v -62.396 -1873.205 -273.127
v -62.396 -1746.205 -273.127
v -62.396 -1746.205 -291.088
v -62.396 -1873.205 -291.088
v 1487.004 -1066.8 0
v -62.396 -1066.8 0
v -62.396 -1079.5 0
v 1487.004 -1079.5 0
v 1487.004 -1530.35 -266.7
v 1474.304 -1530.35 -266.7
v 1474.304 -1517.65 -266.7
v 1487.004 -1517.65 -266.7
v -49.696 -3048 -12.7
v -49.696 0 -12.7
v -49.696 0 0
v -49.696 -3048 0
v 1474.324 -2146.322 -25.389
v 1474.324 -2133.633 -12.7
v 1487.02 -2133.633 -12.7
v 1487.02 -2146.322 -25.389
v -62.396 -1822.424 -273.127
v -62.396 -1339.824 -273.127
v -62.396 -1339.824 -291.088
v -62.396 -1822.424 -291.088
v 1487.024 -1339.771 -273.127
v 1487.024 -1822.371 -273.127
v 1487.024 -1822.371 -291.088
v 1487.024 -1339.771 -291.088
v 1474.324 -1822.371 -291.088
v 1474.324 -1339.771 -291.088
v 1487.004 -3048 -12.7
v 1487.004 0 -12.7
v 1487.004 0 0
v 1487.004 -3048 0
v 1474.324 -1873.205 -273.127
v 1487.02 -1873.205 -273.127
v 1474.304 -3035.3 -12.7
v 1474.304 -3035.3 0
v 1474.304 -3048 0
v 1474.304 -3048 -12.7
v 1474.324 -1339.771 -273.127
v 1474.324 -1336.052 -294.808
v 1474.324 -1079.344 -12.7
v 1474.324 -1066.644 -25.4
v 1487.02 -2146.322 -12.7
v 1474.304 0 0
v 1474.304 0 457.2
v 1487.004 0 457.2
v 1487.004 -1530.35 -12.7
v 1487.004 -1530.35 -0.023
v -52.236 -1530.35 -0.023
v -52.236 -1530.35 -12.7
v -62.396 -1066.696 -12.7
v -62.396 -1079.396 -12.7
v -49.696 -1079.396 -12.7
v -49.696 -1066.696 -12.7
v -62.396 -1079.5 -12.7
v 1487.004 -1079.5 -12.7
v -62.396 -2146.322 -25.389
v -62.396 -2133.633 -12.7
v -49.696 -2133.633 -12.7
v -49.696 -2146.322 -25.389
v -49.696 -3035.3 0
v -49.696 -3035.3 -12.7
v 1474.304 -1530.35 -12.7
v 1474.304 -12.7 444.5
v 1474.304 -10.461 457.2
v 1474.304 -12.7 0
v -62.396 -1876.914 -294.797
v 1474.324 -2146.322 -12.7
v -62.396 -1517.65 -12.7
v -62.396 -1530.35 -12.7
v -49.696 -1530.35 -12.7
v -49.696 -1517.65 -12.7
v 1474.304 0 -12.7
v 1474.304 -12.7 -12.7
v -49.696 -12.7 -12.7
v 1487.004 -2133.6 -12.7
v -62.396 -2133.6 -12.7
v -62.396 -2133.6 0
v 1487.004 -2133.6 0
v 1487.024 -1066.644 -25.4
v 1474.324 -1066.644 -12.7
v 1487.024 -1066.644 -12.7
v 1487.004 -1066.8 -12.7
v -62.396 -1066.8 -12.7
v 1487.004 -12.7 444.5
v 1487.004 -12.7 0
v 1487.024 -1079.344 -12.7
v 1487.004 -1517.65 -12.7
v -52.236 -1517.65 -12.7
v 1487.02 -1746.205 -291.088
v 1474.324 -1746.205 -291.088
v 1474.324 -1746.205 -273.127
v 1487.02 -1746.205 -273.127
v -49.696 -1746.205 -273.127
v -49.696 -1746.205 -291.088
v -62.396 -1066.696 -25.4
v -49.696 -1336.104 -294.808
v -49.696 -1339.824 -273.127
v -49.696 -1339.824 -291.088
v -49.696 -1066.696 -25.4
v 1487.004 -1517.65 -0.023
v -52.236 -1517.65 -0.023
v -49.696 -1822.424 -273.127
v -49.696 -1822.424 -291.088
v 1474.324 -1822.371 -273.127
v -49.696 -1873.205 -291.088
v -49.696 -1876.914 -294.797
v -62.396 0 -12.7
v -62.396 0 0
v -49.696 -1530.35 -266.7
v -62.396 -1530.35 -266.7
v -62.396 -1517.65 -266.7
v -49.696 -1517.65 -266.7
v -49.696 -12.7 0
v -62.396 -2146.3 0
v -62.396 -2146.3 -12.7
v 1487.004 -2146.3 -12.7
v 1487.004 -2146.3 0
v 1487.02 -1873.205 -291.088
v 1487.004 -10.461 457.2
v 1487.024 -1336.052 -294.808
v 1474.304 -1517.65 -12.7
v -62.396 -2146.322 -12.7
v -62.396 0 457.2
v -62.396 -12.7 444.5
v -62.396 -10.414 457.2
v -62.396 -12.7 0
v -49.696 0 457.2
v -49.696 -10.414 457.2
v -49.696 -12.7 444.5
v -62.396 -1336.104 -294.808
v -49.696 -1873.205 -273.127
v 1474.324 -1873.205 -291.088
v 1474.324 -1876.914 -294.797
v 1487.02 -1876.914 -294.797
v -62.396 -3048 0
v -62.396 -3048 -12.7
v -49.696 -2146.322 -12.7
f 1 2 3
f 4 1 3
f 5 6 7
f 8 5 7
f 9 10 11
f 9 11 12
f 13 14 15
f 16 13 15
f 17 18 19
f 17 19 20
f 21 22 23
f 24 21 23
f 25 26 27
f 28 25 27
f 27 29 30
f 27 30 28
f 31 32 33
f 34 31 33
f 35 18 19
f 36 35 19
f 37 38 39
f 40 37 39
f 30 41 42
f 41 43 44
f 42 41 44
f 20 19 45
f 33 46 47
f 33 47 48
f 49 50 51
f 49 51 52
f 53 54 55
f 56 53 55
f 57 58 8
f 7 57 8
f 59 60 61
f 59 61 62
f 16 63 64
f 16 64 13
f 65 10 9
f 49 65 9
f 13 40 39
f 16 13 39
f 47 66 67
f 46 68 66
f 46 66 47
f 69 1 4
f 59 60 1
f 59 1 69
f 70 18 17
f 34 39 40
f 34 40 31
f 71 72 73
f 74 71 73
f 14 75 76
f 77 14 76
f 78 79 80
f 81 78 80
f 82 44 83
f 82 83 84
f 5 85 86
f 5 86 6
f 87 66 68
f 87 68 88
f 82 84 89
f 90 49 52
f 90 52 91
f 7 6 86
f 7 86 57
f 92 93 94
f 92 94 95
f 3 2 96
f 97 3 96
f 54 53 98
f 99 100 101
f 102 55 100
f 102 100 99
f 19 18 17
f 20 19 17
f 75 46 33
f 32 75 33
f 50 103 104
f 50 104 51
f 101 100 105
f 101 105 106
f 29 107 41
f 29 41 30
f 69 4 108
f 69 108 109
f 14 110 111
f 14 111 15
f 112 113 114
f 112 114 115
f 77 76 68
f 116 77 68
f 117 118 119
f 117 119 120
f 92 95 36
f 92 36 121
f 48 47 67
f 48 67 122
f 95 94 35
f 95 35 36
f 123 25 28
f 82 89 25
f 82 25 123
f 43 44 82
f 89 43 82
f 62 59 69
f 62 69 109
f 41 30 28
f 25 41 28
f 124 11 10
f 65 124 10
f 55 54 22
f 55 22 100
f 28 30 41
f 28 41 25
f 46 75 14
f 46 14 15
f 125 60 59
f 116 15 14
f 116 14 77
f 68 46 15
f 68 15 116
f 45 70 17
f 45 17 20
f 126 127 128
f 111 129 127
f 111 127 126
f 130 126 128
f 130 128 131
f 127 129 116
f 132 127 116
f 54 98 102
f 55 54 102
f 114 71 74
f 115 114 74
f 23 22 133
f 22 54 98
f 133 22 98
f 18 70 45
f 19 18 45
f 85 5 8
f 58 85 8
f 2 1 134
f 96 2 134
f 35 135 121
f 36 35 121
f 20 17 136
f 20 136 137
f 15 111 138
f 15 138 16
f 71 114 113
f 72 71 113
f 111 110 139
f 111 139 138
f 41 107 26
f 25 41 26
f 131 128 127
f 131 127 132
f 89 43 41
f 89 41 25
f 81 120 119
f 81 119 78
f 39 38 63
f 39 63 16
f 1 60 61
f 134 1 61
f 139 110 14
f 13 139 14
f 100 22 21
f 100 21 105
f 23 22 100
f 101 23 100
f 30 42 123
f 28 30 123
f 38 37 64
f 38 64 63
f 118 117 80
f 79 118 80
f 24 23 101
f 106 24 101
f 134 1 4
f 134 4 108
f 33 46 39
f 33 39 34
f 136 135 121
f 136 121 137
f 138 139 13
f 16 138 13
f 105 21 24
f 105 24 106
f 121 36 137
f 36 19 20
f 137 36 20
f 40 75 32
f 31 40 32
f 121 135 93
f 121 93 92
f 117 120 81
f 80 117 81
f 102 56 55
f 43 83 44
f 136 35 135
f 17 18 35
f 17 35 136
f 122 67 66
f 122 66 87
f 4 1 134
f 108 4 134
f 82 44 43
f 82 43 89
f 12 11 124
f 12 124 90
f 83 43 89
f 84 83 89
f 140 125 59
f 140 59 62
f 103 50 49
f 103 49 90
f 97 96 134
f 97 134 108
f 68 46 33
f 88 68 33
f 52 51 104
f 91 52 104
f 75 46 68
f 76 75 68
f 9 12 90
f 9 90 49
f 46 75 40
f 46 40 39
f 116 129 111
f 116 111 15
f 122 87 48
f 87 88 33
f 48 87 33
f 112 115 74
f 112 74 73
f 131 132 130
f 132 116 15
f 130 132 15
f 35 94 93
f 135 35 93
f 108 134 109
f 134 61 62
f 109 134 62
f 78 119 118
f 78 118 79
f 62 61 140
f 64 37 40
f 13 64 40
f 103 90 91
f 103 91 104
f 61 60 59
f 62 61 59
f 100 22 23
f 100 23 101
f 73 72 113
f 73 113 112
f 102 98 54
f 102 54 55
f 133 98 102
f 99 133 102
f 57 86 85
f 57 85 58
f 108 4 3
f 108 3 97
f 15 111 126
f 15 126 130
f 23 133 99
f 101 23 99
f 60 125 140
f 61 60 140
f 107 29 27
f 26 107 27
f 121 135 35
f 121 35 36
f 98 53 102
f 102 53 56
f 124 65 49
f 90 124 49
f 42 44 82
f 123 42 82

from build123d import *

# Parameters (mm, degrees)
F0_W           = 12.7
F0_H           = 12.7
F1_DEPTH       = 3048
F2_W           = 12.7
F2_H           = 12.7
F3_DEPTH       = 1524
F5_DEPTH       = 1539.24
F6_W           = 12.7
F6_H           = 12.7
F7_DEPTH       = 254
F8_W           = 12.7
F8_H           = 12.7
F9_DEPTH       = 1549.4
F10_W          = 12.7
F10_H          = 12.7
F11_DEPTH      = 1549.4
F12_W          = 12.7
F12_H          = 12.6888751984
F13_DEPTH      = 12.7
F12_W_2        = 12.6959085464
F12_H_2        = 12.7
F14_T1_DEPTH   = 78.0207478943
F14_2_T1_DEPTH = 78.0166564408
F15_SIZE2      = 12.69999
F15_SIZE       = 12.69999
F15_2_SIZE2    = 12.69999
F15_2_SIZE     = 12.69999
F16_DEPTH      = 381
F17_SIZE2      = 12.7
F17_SIZE       = 12.7
F17_2_SIZE2    = 12.7
F17_2_SIZE     = 12.7
F18_DEPTH      = 482.6
F19_DEPTH      = 381
F20_SIZE2      = 12.7
F20_SIZE       = 12.7
F20_2_SIZE2    = 12.7
F20_2_SIZE     = 12.7
F21_DEPTH      = 127
F22_W          = 12.7
F22_H          = 12.7
F23_DEPTH      = 457.2
F24_SIZE2      = 2.239352655
F24_SIZE       = 12.7
F25_SIZE2      = 12.7
F25_SIZE       = 2.286


# Not quite as in the source:
# - a fillet or chamfer that OpenCascade refuses, or shapes differently, is made with other operations: its cross-section is extruded or revolved along the edge and cut away or added
# - a fillet or chamfer is up to 0.001 mm smaller than in the source, because OpenCascade refuses the exact size


with BuildPart() as f1:
    # F0 (on Front) → F1 (new body)
    with BuildSketch(Plane.XZ):
        with Locations((1480.6543715816, -6.35)):
            Rectangle(F0_W, F0_H)
    extrude(amount=F1_DEPTH)


with BuildPart() as f1b:
    # F0 (on Front) → F1, piece 2 (new body)
    with BuildSketch(Plane.XZ):
        with Locations((-56.0456284184, -6.35)):
            Rectangle(F0_W, F0_H)
    extrude(amount=F1_DEPTH)


with BuildPart() as f3:
    # F2 (on face) → F3 (new body)
    with BuildSketch(Plane(origin=(1474.3043715816, 0, 0), x_dir=(0, -1, 0), z_dir=(-1, 0, 0))):
        with Locations((6.35, -6.35)):
            Rectangle(F2_W, F2_H)
    extrude(amount=F3_DEPTH)


with BuildPart() as f3b:
    # F2 (on face) → F3, piece 2 (new body)
    with BuildSketch(Plane(origin=(1474.3043715816, 0, 0), x_dir=(0, -1, 0), z_dir=(-1, 0, 0))):
        with Locations((3041.65, -6.35)):
            Rectangle(F2_W, F2_H)
    extrude(amount=F3_DEPTH)


with BuildPart() as f5:
    # F4 (on face) → F5 (new body)
    with BuildSketch(Plane.YZ.offset(1487.0043715816)):
        Polygon((-1530.35, -0.0233579591), (-1530.35, -12.7), (-1524, -12.7), (-1517.65, -12.7), (-1517.65, -0.0233579591), align=None)
    extrude(amount=-F5_DEPTH)


with BuildPart() as f7:
    # F6 (on face) → F7 (new body)
    with BuildSketch(Plane(origin=(0, 0, -12.7), x_dir=(1, 0, 0), z_dir=(0, 0, -1))):
        with Locations((1480.6543715816, 1524.0000082016)):
            Rectangle(F6_W, F6_H)
    extrude(amount=F7_DEPTH)


with BuildPart() as f7b:
    # F6 (on face) → F7, piece 2 (new body)
    with BuildSketch(Plane(origin=(0, 0, -12.7), x_dir=(1, 0, 0), z_dir=(0, 0, -1))):
        with Locations((-56.0456471682, 1524.0001274109)):
            Rectangle(F6_W, F6_H)
    extrude(amount=F7_DEPTH)


with BuildPart() as f9:
    # F8 (on face) → F9 (new body)
    with BuildSketch(Plane.YZ.offset(1487.0043715816)):
        with Locations((-2139.95, -6.35)):
            Rectangle(F8_W, F8_H)
    extrude(amount=-F9_DEPTH)


with BuildPart() as f11:
    # F10 (on face) → F11 (new body)
    with BuildSketch(Plane(origin=(-62.3956284184, 0, 0), x_dir=(0, -1, 0), z_dir=(-1, 0, 0))):
        with Locations((1073.15, -6.35)):
            Rectangle(F10_W, F10_H)
    extrude(amount=-F11_DEPTH)


with BuildPart() as f13:
    # F12 (on face) → F13 (new body)
    with BuildSketch(Plane(origin=(0, 0, -12.7), x_dir=(1, 0, 0), z_dir=(0, 0, -1))):
        with Locations((-56.0456284184, 2139.9773359299)):
            Rectangle(F12_W, F12_H)
    extrude(amount=F13_DEPTH)

    # F14: chamfer of 12.7 on 1 edges, made by hand

    # F14_s2 → F14_t1 (cut)
    with BuildSketch(Plane.YZ.offset(-95.0560023656)):
        Polygon((-2133.6328983307, -12.7), (-2146.3328983307, -25.4), (-2133.6328983307, -25.4), align=None)
    extrude(amount=F14_T1_DEPTH, mode=Mode.SUBTRACT)


with BuildPart() as f13b:
    # F12 (on face) → F13, piece 2 (new body)
    with BuildSketch(Plane(origin=(0, 0, -12.7), x_dir=(1, 0, 0), z_dir=(0, 0, -1))):
        with Locations((1480.6722998619, 2139.9773359299)):
            Rectangle(F12_W_2, F12_H)
    extrude(amount=F13_DEPTH)

    # F14#2: chamfer of 12.7 on 1 edges, made by hand

    # F14_2_s2 → F14_2_t1 (cut)
    with BuildSketch(Plane.YZ.offset(1441.6639716415)):
        Polygon((-2133.6328983307, -12.7), (-2146.3328983307, -25.4), (-2133.6328983307, -25.4), align=None)
    extrude(amount=F14_2_T1_DEPTH, mode=Mode.SUBTRACT)


with BuildPart() as f13c:
    # F12 (on face) → F13, piece 3 (new body)
    with BuildSketch(Plane(origin=(0, 0, -12.7), x_dir=(1, 0, 0), z_dir=(0, 0, -1))):
        with Locations((1480.6743455887, 1072.9938341141)):
            Rectangle(F12_W, F12_H_2)
    extrude(amount=F13_DEPTH)

    # F15 (size 12.7 and 12.7 in the source; OpenCascade refuses exactly that, so slightly less here)
    f15_edges = [f13c.edges().sort_by_distance(p)[0] for p in [
        (1480.674346, -1079.343834, -25.4),
    ]]
    chamfer(f15_edges, length=F15_SIZE, length2=F15_SIZE2)


with BuildPart() as f13d:
    # F12 (on face) → F13, piece 4 (new body)
    with BuildSketch(Plane(origin=(0, 0, -12.7), x_dir=(1, 0, 0), z_dir=(0, 0, -1))):
        with Locations((-56.0456284184, 1073.0461669922)):
            Rectangle(F12_W, F12_H_2)
    extrude(amount=F13_DEPTH)

    # F15#2 (size 12.7 and 12.7 in the source; OpenCascade refuses exactly that, so slightly less here)
    f15_2_edges = [f13d.edges().sort_by_distance(p)[0] for p in [
        (-56.045628, -1079.396167, -25.4),
    ]]
    chamfer(f15_2_edges, length=F15_2_SIZE, length2=F15_2_SIZE2)


with BuildPart() as f16:
    # F16 (new): a face of the model
    f16_faces = [f13c.part.faces().sort_by_distance(p)[0] for p in [
        (1480.6743455887, -1072.9938391141, -19.050005),
    ]]
    extrude(f16_faces, amount=F16_DEPTH)

    # F17
    f17_edges = [f16.edges().sort_by_distance(p)[0] for p in [
        (1480.674346, -1348.751518, -282.107694),
    ]]
    chamfer(f17_edges, length=F17_SIZE, length2=F17_SIZE2)


with BuildPart() as f16b:
    # F16#2 (new): a face of the model
    f16_2_faces = [f13d.part.faces().sort_by_distance(p)[0] for p in [
        (-56.0456284184, -1073.0461719922, -19.050005),
    ]]
    extrude(f16_2_faces, amount=F16_DEPTH)

    # F17#2
    f17_2_edges = [f16b.edges().sort_by_distance(p)[0] for p in [
        (-56.045628, -1348.803851, -282.107694),
    ]]
    chamfer(f17_2_edges, length=F17_2_SIZE, length2=F17_2_SIZE2)


with BuildPart() as f18:
    # F18 (new): a face of the model
    f18_faces = [f16b.part.faces().sort_by_distance(p)[0] for p in [
        (-56.0456284184, -1339.8235945032, -282.1076936321),
    ]]
    extrude(f18_faces, amount=F18_DEPTH)


with BuildPart() as f18b:
    # F18#2 (new): a face of the model
    f18_2_faces = [f16.part.faces().sort_by_distance(p)[0] for p in [
        (1480.6743455887, -1339.7712616251, -282.1076936321),
    ]]
    extrude(f18_2_faces, amount=F18_DEPTH)


with BuildPart() as f19:
    # F19 (new): a face of the model
    f19_faces = [f13.part.faces().sort_by_distance(p)[0] for p in [
        (-56.0456284184, -2139.9773359299, -19.0444375992),
    ]]
    extrude(f19_faces, amount=F19_DEPTH)

    # F20
    f20_edges = [f19.edges().sort_by_distance(p)[0] for p in [
        (-56.045628, -1864.225215, -282.107684),
    ]]
    chamfer(f20_edges, length=F20_SIZE, length2=F20_SIZE2)


with BuildPart() as f19b:
    # F19#2 (new): a face of the model
    f19_2_faces = [f13b.part.faces().sort_by_distance(p)[0] for p in [
        (1480.6722998619, -2139.9773359299, -19.0444375992),
    ]]
    extrude(f19_2_faces, amount=F19_DEPTH)

    # F20#2
    f20_2_edges = [f19b.edges().sort_by_distance(p)[0] for p in [
        (1480.6723, -1864.225215, -282.107684),
    ]]
    chamfer(f20_2_edges, length=F20_2_SIZE, length2=F20_2_SIZE2)


with BuildPart() as f21:
    # F21 (new): a face of the model
    f21_faces = [f19.part.faces().sort_by_distance(p)[0] for p in [
        (-56.0456284184, -1873.2054708197, -282.1076836321),
    ]]
    extrude(f21_faces, amount=F21_DEPTH)


with BuildPart() as f21b:
    # F21#2 (new): a face of the model
    f21_2_faces = [f19b.part.faces().sort_by_distance(p)[0] for p in [
        (1480.6722998619, -1873.2054708197, -282.1076836321),
    ]]
    extrude(f21_2_faces, amount=F21_DEPTH)


with BuildPart() as f23:
    # F22 (on face) → F23 (new body)
    with BuildSketch(Plane.XY):
        with Locations((-56.0456284184, -6.35)):
            Rectangle(F22_W, F22_H)
    extrude(amount=F23_DEPTH)

    # F25
    f25_edges = [f23.edges().sort_by_distance(p)[0] for p in [
        (-56.045628, -12.7, 457.2),
    ]]
    f25_side = f23.faces().sort_by_distance((-56.045628, -6.35, 457.2))[0]
    chamfer(f25_edges, length=F25_SIZE, length2=F25_SIZE2, reference=f25_side)


with BuildPart() as f23b:
    # F22 (on face) → F23, piece 2 (new body)
    with BuildSketch(Plane.XY):
        with Locations((1480.6544376373, -6.35)):
            Rectangle(F22_W, F22_H)
    extrude(amount=F23_DEPTH)

    # F24
    f24_edges = [f23b.edges().sort_by_distance(p)[0] for p in [
        (1480.654438, -12.7, 457.2),
    ]]
    f24_side = f23b.faces().sort_by_distance((1480.654438, -12.7, 228.6))[0]
    chamfer(f24_edges, length=F24_SIZE, length2=F24_SIZE2, reference=f24_side)


solid = Compound([f1.part, f1b.part, f3.part, f3b.part, f5.part, f7.part, f7b.part, f9.part, f11.part, f13.part, f13b.part, f13c.part, f13d.part, f16.part, f16b.part, f18.part, f18b.part, f19.part, f19b.part, f21.part, f21b.part, f23.part, f23b.part])
